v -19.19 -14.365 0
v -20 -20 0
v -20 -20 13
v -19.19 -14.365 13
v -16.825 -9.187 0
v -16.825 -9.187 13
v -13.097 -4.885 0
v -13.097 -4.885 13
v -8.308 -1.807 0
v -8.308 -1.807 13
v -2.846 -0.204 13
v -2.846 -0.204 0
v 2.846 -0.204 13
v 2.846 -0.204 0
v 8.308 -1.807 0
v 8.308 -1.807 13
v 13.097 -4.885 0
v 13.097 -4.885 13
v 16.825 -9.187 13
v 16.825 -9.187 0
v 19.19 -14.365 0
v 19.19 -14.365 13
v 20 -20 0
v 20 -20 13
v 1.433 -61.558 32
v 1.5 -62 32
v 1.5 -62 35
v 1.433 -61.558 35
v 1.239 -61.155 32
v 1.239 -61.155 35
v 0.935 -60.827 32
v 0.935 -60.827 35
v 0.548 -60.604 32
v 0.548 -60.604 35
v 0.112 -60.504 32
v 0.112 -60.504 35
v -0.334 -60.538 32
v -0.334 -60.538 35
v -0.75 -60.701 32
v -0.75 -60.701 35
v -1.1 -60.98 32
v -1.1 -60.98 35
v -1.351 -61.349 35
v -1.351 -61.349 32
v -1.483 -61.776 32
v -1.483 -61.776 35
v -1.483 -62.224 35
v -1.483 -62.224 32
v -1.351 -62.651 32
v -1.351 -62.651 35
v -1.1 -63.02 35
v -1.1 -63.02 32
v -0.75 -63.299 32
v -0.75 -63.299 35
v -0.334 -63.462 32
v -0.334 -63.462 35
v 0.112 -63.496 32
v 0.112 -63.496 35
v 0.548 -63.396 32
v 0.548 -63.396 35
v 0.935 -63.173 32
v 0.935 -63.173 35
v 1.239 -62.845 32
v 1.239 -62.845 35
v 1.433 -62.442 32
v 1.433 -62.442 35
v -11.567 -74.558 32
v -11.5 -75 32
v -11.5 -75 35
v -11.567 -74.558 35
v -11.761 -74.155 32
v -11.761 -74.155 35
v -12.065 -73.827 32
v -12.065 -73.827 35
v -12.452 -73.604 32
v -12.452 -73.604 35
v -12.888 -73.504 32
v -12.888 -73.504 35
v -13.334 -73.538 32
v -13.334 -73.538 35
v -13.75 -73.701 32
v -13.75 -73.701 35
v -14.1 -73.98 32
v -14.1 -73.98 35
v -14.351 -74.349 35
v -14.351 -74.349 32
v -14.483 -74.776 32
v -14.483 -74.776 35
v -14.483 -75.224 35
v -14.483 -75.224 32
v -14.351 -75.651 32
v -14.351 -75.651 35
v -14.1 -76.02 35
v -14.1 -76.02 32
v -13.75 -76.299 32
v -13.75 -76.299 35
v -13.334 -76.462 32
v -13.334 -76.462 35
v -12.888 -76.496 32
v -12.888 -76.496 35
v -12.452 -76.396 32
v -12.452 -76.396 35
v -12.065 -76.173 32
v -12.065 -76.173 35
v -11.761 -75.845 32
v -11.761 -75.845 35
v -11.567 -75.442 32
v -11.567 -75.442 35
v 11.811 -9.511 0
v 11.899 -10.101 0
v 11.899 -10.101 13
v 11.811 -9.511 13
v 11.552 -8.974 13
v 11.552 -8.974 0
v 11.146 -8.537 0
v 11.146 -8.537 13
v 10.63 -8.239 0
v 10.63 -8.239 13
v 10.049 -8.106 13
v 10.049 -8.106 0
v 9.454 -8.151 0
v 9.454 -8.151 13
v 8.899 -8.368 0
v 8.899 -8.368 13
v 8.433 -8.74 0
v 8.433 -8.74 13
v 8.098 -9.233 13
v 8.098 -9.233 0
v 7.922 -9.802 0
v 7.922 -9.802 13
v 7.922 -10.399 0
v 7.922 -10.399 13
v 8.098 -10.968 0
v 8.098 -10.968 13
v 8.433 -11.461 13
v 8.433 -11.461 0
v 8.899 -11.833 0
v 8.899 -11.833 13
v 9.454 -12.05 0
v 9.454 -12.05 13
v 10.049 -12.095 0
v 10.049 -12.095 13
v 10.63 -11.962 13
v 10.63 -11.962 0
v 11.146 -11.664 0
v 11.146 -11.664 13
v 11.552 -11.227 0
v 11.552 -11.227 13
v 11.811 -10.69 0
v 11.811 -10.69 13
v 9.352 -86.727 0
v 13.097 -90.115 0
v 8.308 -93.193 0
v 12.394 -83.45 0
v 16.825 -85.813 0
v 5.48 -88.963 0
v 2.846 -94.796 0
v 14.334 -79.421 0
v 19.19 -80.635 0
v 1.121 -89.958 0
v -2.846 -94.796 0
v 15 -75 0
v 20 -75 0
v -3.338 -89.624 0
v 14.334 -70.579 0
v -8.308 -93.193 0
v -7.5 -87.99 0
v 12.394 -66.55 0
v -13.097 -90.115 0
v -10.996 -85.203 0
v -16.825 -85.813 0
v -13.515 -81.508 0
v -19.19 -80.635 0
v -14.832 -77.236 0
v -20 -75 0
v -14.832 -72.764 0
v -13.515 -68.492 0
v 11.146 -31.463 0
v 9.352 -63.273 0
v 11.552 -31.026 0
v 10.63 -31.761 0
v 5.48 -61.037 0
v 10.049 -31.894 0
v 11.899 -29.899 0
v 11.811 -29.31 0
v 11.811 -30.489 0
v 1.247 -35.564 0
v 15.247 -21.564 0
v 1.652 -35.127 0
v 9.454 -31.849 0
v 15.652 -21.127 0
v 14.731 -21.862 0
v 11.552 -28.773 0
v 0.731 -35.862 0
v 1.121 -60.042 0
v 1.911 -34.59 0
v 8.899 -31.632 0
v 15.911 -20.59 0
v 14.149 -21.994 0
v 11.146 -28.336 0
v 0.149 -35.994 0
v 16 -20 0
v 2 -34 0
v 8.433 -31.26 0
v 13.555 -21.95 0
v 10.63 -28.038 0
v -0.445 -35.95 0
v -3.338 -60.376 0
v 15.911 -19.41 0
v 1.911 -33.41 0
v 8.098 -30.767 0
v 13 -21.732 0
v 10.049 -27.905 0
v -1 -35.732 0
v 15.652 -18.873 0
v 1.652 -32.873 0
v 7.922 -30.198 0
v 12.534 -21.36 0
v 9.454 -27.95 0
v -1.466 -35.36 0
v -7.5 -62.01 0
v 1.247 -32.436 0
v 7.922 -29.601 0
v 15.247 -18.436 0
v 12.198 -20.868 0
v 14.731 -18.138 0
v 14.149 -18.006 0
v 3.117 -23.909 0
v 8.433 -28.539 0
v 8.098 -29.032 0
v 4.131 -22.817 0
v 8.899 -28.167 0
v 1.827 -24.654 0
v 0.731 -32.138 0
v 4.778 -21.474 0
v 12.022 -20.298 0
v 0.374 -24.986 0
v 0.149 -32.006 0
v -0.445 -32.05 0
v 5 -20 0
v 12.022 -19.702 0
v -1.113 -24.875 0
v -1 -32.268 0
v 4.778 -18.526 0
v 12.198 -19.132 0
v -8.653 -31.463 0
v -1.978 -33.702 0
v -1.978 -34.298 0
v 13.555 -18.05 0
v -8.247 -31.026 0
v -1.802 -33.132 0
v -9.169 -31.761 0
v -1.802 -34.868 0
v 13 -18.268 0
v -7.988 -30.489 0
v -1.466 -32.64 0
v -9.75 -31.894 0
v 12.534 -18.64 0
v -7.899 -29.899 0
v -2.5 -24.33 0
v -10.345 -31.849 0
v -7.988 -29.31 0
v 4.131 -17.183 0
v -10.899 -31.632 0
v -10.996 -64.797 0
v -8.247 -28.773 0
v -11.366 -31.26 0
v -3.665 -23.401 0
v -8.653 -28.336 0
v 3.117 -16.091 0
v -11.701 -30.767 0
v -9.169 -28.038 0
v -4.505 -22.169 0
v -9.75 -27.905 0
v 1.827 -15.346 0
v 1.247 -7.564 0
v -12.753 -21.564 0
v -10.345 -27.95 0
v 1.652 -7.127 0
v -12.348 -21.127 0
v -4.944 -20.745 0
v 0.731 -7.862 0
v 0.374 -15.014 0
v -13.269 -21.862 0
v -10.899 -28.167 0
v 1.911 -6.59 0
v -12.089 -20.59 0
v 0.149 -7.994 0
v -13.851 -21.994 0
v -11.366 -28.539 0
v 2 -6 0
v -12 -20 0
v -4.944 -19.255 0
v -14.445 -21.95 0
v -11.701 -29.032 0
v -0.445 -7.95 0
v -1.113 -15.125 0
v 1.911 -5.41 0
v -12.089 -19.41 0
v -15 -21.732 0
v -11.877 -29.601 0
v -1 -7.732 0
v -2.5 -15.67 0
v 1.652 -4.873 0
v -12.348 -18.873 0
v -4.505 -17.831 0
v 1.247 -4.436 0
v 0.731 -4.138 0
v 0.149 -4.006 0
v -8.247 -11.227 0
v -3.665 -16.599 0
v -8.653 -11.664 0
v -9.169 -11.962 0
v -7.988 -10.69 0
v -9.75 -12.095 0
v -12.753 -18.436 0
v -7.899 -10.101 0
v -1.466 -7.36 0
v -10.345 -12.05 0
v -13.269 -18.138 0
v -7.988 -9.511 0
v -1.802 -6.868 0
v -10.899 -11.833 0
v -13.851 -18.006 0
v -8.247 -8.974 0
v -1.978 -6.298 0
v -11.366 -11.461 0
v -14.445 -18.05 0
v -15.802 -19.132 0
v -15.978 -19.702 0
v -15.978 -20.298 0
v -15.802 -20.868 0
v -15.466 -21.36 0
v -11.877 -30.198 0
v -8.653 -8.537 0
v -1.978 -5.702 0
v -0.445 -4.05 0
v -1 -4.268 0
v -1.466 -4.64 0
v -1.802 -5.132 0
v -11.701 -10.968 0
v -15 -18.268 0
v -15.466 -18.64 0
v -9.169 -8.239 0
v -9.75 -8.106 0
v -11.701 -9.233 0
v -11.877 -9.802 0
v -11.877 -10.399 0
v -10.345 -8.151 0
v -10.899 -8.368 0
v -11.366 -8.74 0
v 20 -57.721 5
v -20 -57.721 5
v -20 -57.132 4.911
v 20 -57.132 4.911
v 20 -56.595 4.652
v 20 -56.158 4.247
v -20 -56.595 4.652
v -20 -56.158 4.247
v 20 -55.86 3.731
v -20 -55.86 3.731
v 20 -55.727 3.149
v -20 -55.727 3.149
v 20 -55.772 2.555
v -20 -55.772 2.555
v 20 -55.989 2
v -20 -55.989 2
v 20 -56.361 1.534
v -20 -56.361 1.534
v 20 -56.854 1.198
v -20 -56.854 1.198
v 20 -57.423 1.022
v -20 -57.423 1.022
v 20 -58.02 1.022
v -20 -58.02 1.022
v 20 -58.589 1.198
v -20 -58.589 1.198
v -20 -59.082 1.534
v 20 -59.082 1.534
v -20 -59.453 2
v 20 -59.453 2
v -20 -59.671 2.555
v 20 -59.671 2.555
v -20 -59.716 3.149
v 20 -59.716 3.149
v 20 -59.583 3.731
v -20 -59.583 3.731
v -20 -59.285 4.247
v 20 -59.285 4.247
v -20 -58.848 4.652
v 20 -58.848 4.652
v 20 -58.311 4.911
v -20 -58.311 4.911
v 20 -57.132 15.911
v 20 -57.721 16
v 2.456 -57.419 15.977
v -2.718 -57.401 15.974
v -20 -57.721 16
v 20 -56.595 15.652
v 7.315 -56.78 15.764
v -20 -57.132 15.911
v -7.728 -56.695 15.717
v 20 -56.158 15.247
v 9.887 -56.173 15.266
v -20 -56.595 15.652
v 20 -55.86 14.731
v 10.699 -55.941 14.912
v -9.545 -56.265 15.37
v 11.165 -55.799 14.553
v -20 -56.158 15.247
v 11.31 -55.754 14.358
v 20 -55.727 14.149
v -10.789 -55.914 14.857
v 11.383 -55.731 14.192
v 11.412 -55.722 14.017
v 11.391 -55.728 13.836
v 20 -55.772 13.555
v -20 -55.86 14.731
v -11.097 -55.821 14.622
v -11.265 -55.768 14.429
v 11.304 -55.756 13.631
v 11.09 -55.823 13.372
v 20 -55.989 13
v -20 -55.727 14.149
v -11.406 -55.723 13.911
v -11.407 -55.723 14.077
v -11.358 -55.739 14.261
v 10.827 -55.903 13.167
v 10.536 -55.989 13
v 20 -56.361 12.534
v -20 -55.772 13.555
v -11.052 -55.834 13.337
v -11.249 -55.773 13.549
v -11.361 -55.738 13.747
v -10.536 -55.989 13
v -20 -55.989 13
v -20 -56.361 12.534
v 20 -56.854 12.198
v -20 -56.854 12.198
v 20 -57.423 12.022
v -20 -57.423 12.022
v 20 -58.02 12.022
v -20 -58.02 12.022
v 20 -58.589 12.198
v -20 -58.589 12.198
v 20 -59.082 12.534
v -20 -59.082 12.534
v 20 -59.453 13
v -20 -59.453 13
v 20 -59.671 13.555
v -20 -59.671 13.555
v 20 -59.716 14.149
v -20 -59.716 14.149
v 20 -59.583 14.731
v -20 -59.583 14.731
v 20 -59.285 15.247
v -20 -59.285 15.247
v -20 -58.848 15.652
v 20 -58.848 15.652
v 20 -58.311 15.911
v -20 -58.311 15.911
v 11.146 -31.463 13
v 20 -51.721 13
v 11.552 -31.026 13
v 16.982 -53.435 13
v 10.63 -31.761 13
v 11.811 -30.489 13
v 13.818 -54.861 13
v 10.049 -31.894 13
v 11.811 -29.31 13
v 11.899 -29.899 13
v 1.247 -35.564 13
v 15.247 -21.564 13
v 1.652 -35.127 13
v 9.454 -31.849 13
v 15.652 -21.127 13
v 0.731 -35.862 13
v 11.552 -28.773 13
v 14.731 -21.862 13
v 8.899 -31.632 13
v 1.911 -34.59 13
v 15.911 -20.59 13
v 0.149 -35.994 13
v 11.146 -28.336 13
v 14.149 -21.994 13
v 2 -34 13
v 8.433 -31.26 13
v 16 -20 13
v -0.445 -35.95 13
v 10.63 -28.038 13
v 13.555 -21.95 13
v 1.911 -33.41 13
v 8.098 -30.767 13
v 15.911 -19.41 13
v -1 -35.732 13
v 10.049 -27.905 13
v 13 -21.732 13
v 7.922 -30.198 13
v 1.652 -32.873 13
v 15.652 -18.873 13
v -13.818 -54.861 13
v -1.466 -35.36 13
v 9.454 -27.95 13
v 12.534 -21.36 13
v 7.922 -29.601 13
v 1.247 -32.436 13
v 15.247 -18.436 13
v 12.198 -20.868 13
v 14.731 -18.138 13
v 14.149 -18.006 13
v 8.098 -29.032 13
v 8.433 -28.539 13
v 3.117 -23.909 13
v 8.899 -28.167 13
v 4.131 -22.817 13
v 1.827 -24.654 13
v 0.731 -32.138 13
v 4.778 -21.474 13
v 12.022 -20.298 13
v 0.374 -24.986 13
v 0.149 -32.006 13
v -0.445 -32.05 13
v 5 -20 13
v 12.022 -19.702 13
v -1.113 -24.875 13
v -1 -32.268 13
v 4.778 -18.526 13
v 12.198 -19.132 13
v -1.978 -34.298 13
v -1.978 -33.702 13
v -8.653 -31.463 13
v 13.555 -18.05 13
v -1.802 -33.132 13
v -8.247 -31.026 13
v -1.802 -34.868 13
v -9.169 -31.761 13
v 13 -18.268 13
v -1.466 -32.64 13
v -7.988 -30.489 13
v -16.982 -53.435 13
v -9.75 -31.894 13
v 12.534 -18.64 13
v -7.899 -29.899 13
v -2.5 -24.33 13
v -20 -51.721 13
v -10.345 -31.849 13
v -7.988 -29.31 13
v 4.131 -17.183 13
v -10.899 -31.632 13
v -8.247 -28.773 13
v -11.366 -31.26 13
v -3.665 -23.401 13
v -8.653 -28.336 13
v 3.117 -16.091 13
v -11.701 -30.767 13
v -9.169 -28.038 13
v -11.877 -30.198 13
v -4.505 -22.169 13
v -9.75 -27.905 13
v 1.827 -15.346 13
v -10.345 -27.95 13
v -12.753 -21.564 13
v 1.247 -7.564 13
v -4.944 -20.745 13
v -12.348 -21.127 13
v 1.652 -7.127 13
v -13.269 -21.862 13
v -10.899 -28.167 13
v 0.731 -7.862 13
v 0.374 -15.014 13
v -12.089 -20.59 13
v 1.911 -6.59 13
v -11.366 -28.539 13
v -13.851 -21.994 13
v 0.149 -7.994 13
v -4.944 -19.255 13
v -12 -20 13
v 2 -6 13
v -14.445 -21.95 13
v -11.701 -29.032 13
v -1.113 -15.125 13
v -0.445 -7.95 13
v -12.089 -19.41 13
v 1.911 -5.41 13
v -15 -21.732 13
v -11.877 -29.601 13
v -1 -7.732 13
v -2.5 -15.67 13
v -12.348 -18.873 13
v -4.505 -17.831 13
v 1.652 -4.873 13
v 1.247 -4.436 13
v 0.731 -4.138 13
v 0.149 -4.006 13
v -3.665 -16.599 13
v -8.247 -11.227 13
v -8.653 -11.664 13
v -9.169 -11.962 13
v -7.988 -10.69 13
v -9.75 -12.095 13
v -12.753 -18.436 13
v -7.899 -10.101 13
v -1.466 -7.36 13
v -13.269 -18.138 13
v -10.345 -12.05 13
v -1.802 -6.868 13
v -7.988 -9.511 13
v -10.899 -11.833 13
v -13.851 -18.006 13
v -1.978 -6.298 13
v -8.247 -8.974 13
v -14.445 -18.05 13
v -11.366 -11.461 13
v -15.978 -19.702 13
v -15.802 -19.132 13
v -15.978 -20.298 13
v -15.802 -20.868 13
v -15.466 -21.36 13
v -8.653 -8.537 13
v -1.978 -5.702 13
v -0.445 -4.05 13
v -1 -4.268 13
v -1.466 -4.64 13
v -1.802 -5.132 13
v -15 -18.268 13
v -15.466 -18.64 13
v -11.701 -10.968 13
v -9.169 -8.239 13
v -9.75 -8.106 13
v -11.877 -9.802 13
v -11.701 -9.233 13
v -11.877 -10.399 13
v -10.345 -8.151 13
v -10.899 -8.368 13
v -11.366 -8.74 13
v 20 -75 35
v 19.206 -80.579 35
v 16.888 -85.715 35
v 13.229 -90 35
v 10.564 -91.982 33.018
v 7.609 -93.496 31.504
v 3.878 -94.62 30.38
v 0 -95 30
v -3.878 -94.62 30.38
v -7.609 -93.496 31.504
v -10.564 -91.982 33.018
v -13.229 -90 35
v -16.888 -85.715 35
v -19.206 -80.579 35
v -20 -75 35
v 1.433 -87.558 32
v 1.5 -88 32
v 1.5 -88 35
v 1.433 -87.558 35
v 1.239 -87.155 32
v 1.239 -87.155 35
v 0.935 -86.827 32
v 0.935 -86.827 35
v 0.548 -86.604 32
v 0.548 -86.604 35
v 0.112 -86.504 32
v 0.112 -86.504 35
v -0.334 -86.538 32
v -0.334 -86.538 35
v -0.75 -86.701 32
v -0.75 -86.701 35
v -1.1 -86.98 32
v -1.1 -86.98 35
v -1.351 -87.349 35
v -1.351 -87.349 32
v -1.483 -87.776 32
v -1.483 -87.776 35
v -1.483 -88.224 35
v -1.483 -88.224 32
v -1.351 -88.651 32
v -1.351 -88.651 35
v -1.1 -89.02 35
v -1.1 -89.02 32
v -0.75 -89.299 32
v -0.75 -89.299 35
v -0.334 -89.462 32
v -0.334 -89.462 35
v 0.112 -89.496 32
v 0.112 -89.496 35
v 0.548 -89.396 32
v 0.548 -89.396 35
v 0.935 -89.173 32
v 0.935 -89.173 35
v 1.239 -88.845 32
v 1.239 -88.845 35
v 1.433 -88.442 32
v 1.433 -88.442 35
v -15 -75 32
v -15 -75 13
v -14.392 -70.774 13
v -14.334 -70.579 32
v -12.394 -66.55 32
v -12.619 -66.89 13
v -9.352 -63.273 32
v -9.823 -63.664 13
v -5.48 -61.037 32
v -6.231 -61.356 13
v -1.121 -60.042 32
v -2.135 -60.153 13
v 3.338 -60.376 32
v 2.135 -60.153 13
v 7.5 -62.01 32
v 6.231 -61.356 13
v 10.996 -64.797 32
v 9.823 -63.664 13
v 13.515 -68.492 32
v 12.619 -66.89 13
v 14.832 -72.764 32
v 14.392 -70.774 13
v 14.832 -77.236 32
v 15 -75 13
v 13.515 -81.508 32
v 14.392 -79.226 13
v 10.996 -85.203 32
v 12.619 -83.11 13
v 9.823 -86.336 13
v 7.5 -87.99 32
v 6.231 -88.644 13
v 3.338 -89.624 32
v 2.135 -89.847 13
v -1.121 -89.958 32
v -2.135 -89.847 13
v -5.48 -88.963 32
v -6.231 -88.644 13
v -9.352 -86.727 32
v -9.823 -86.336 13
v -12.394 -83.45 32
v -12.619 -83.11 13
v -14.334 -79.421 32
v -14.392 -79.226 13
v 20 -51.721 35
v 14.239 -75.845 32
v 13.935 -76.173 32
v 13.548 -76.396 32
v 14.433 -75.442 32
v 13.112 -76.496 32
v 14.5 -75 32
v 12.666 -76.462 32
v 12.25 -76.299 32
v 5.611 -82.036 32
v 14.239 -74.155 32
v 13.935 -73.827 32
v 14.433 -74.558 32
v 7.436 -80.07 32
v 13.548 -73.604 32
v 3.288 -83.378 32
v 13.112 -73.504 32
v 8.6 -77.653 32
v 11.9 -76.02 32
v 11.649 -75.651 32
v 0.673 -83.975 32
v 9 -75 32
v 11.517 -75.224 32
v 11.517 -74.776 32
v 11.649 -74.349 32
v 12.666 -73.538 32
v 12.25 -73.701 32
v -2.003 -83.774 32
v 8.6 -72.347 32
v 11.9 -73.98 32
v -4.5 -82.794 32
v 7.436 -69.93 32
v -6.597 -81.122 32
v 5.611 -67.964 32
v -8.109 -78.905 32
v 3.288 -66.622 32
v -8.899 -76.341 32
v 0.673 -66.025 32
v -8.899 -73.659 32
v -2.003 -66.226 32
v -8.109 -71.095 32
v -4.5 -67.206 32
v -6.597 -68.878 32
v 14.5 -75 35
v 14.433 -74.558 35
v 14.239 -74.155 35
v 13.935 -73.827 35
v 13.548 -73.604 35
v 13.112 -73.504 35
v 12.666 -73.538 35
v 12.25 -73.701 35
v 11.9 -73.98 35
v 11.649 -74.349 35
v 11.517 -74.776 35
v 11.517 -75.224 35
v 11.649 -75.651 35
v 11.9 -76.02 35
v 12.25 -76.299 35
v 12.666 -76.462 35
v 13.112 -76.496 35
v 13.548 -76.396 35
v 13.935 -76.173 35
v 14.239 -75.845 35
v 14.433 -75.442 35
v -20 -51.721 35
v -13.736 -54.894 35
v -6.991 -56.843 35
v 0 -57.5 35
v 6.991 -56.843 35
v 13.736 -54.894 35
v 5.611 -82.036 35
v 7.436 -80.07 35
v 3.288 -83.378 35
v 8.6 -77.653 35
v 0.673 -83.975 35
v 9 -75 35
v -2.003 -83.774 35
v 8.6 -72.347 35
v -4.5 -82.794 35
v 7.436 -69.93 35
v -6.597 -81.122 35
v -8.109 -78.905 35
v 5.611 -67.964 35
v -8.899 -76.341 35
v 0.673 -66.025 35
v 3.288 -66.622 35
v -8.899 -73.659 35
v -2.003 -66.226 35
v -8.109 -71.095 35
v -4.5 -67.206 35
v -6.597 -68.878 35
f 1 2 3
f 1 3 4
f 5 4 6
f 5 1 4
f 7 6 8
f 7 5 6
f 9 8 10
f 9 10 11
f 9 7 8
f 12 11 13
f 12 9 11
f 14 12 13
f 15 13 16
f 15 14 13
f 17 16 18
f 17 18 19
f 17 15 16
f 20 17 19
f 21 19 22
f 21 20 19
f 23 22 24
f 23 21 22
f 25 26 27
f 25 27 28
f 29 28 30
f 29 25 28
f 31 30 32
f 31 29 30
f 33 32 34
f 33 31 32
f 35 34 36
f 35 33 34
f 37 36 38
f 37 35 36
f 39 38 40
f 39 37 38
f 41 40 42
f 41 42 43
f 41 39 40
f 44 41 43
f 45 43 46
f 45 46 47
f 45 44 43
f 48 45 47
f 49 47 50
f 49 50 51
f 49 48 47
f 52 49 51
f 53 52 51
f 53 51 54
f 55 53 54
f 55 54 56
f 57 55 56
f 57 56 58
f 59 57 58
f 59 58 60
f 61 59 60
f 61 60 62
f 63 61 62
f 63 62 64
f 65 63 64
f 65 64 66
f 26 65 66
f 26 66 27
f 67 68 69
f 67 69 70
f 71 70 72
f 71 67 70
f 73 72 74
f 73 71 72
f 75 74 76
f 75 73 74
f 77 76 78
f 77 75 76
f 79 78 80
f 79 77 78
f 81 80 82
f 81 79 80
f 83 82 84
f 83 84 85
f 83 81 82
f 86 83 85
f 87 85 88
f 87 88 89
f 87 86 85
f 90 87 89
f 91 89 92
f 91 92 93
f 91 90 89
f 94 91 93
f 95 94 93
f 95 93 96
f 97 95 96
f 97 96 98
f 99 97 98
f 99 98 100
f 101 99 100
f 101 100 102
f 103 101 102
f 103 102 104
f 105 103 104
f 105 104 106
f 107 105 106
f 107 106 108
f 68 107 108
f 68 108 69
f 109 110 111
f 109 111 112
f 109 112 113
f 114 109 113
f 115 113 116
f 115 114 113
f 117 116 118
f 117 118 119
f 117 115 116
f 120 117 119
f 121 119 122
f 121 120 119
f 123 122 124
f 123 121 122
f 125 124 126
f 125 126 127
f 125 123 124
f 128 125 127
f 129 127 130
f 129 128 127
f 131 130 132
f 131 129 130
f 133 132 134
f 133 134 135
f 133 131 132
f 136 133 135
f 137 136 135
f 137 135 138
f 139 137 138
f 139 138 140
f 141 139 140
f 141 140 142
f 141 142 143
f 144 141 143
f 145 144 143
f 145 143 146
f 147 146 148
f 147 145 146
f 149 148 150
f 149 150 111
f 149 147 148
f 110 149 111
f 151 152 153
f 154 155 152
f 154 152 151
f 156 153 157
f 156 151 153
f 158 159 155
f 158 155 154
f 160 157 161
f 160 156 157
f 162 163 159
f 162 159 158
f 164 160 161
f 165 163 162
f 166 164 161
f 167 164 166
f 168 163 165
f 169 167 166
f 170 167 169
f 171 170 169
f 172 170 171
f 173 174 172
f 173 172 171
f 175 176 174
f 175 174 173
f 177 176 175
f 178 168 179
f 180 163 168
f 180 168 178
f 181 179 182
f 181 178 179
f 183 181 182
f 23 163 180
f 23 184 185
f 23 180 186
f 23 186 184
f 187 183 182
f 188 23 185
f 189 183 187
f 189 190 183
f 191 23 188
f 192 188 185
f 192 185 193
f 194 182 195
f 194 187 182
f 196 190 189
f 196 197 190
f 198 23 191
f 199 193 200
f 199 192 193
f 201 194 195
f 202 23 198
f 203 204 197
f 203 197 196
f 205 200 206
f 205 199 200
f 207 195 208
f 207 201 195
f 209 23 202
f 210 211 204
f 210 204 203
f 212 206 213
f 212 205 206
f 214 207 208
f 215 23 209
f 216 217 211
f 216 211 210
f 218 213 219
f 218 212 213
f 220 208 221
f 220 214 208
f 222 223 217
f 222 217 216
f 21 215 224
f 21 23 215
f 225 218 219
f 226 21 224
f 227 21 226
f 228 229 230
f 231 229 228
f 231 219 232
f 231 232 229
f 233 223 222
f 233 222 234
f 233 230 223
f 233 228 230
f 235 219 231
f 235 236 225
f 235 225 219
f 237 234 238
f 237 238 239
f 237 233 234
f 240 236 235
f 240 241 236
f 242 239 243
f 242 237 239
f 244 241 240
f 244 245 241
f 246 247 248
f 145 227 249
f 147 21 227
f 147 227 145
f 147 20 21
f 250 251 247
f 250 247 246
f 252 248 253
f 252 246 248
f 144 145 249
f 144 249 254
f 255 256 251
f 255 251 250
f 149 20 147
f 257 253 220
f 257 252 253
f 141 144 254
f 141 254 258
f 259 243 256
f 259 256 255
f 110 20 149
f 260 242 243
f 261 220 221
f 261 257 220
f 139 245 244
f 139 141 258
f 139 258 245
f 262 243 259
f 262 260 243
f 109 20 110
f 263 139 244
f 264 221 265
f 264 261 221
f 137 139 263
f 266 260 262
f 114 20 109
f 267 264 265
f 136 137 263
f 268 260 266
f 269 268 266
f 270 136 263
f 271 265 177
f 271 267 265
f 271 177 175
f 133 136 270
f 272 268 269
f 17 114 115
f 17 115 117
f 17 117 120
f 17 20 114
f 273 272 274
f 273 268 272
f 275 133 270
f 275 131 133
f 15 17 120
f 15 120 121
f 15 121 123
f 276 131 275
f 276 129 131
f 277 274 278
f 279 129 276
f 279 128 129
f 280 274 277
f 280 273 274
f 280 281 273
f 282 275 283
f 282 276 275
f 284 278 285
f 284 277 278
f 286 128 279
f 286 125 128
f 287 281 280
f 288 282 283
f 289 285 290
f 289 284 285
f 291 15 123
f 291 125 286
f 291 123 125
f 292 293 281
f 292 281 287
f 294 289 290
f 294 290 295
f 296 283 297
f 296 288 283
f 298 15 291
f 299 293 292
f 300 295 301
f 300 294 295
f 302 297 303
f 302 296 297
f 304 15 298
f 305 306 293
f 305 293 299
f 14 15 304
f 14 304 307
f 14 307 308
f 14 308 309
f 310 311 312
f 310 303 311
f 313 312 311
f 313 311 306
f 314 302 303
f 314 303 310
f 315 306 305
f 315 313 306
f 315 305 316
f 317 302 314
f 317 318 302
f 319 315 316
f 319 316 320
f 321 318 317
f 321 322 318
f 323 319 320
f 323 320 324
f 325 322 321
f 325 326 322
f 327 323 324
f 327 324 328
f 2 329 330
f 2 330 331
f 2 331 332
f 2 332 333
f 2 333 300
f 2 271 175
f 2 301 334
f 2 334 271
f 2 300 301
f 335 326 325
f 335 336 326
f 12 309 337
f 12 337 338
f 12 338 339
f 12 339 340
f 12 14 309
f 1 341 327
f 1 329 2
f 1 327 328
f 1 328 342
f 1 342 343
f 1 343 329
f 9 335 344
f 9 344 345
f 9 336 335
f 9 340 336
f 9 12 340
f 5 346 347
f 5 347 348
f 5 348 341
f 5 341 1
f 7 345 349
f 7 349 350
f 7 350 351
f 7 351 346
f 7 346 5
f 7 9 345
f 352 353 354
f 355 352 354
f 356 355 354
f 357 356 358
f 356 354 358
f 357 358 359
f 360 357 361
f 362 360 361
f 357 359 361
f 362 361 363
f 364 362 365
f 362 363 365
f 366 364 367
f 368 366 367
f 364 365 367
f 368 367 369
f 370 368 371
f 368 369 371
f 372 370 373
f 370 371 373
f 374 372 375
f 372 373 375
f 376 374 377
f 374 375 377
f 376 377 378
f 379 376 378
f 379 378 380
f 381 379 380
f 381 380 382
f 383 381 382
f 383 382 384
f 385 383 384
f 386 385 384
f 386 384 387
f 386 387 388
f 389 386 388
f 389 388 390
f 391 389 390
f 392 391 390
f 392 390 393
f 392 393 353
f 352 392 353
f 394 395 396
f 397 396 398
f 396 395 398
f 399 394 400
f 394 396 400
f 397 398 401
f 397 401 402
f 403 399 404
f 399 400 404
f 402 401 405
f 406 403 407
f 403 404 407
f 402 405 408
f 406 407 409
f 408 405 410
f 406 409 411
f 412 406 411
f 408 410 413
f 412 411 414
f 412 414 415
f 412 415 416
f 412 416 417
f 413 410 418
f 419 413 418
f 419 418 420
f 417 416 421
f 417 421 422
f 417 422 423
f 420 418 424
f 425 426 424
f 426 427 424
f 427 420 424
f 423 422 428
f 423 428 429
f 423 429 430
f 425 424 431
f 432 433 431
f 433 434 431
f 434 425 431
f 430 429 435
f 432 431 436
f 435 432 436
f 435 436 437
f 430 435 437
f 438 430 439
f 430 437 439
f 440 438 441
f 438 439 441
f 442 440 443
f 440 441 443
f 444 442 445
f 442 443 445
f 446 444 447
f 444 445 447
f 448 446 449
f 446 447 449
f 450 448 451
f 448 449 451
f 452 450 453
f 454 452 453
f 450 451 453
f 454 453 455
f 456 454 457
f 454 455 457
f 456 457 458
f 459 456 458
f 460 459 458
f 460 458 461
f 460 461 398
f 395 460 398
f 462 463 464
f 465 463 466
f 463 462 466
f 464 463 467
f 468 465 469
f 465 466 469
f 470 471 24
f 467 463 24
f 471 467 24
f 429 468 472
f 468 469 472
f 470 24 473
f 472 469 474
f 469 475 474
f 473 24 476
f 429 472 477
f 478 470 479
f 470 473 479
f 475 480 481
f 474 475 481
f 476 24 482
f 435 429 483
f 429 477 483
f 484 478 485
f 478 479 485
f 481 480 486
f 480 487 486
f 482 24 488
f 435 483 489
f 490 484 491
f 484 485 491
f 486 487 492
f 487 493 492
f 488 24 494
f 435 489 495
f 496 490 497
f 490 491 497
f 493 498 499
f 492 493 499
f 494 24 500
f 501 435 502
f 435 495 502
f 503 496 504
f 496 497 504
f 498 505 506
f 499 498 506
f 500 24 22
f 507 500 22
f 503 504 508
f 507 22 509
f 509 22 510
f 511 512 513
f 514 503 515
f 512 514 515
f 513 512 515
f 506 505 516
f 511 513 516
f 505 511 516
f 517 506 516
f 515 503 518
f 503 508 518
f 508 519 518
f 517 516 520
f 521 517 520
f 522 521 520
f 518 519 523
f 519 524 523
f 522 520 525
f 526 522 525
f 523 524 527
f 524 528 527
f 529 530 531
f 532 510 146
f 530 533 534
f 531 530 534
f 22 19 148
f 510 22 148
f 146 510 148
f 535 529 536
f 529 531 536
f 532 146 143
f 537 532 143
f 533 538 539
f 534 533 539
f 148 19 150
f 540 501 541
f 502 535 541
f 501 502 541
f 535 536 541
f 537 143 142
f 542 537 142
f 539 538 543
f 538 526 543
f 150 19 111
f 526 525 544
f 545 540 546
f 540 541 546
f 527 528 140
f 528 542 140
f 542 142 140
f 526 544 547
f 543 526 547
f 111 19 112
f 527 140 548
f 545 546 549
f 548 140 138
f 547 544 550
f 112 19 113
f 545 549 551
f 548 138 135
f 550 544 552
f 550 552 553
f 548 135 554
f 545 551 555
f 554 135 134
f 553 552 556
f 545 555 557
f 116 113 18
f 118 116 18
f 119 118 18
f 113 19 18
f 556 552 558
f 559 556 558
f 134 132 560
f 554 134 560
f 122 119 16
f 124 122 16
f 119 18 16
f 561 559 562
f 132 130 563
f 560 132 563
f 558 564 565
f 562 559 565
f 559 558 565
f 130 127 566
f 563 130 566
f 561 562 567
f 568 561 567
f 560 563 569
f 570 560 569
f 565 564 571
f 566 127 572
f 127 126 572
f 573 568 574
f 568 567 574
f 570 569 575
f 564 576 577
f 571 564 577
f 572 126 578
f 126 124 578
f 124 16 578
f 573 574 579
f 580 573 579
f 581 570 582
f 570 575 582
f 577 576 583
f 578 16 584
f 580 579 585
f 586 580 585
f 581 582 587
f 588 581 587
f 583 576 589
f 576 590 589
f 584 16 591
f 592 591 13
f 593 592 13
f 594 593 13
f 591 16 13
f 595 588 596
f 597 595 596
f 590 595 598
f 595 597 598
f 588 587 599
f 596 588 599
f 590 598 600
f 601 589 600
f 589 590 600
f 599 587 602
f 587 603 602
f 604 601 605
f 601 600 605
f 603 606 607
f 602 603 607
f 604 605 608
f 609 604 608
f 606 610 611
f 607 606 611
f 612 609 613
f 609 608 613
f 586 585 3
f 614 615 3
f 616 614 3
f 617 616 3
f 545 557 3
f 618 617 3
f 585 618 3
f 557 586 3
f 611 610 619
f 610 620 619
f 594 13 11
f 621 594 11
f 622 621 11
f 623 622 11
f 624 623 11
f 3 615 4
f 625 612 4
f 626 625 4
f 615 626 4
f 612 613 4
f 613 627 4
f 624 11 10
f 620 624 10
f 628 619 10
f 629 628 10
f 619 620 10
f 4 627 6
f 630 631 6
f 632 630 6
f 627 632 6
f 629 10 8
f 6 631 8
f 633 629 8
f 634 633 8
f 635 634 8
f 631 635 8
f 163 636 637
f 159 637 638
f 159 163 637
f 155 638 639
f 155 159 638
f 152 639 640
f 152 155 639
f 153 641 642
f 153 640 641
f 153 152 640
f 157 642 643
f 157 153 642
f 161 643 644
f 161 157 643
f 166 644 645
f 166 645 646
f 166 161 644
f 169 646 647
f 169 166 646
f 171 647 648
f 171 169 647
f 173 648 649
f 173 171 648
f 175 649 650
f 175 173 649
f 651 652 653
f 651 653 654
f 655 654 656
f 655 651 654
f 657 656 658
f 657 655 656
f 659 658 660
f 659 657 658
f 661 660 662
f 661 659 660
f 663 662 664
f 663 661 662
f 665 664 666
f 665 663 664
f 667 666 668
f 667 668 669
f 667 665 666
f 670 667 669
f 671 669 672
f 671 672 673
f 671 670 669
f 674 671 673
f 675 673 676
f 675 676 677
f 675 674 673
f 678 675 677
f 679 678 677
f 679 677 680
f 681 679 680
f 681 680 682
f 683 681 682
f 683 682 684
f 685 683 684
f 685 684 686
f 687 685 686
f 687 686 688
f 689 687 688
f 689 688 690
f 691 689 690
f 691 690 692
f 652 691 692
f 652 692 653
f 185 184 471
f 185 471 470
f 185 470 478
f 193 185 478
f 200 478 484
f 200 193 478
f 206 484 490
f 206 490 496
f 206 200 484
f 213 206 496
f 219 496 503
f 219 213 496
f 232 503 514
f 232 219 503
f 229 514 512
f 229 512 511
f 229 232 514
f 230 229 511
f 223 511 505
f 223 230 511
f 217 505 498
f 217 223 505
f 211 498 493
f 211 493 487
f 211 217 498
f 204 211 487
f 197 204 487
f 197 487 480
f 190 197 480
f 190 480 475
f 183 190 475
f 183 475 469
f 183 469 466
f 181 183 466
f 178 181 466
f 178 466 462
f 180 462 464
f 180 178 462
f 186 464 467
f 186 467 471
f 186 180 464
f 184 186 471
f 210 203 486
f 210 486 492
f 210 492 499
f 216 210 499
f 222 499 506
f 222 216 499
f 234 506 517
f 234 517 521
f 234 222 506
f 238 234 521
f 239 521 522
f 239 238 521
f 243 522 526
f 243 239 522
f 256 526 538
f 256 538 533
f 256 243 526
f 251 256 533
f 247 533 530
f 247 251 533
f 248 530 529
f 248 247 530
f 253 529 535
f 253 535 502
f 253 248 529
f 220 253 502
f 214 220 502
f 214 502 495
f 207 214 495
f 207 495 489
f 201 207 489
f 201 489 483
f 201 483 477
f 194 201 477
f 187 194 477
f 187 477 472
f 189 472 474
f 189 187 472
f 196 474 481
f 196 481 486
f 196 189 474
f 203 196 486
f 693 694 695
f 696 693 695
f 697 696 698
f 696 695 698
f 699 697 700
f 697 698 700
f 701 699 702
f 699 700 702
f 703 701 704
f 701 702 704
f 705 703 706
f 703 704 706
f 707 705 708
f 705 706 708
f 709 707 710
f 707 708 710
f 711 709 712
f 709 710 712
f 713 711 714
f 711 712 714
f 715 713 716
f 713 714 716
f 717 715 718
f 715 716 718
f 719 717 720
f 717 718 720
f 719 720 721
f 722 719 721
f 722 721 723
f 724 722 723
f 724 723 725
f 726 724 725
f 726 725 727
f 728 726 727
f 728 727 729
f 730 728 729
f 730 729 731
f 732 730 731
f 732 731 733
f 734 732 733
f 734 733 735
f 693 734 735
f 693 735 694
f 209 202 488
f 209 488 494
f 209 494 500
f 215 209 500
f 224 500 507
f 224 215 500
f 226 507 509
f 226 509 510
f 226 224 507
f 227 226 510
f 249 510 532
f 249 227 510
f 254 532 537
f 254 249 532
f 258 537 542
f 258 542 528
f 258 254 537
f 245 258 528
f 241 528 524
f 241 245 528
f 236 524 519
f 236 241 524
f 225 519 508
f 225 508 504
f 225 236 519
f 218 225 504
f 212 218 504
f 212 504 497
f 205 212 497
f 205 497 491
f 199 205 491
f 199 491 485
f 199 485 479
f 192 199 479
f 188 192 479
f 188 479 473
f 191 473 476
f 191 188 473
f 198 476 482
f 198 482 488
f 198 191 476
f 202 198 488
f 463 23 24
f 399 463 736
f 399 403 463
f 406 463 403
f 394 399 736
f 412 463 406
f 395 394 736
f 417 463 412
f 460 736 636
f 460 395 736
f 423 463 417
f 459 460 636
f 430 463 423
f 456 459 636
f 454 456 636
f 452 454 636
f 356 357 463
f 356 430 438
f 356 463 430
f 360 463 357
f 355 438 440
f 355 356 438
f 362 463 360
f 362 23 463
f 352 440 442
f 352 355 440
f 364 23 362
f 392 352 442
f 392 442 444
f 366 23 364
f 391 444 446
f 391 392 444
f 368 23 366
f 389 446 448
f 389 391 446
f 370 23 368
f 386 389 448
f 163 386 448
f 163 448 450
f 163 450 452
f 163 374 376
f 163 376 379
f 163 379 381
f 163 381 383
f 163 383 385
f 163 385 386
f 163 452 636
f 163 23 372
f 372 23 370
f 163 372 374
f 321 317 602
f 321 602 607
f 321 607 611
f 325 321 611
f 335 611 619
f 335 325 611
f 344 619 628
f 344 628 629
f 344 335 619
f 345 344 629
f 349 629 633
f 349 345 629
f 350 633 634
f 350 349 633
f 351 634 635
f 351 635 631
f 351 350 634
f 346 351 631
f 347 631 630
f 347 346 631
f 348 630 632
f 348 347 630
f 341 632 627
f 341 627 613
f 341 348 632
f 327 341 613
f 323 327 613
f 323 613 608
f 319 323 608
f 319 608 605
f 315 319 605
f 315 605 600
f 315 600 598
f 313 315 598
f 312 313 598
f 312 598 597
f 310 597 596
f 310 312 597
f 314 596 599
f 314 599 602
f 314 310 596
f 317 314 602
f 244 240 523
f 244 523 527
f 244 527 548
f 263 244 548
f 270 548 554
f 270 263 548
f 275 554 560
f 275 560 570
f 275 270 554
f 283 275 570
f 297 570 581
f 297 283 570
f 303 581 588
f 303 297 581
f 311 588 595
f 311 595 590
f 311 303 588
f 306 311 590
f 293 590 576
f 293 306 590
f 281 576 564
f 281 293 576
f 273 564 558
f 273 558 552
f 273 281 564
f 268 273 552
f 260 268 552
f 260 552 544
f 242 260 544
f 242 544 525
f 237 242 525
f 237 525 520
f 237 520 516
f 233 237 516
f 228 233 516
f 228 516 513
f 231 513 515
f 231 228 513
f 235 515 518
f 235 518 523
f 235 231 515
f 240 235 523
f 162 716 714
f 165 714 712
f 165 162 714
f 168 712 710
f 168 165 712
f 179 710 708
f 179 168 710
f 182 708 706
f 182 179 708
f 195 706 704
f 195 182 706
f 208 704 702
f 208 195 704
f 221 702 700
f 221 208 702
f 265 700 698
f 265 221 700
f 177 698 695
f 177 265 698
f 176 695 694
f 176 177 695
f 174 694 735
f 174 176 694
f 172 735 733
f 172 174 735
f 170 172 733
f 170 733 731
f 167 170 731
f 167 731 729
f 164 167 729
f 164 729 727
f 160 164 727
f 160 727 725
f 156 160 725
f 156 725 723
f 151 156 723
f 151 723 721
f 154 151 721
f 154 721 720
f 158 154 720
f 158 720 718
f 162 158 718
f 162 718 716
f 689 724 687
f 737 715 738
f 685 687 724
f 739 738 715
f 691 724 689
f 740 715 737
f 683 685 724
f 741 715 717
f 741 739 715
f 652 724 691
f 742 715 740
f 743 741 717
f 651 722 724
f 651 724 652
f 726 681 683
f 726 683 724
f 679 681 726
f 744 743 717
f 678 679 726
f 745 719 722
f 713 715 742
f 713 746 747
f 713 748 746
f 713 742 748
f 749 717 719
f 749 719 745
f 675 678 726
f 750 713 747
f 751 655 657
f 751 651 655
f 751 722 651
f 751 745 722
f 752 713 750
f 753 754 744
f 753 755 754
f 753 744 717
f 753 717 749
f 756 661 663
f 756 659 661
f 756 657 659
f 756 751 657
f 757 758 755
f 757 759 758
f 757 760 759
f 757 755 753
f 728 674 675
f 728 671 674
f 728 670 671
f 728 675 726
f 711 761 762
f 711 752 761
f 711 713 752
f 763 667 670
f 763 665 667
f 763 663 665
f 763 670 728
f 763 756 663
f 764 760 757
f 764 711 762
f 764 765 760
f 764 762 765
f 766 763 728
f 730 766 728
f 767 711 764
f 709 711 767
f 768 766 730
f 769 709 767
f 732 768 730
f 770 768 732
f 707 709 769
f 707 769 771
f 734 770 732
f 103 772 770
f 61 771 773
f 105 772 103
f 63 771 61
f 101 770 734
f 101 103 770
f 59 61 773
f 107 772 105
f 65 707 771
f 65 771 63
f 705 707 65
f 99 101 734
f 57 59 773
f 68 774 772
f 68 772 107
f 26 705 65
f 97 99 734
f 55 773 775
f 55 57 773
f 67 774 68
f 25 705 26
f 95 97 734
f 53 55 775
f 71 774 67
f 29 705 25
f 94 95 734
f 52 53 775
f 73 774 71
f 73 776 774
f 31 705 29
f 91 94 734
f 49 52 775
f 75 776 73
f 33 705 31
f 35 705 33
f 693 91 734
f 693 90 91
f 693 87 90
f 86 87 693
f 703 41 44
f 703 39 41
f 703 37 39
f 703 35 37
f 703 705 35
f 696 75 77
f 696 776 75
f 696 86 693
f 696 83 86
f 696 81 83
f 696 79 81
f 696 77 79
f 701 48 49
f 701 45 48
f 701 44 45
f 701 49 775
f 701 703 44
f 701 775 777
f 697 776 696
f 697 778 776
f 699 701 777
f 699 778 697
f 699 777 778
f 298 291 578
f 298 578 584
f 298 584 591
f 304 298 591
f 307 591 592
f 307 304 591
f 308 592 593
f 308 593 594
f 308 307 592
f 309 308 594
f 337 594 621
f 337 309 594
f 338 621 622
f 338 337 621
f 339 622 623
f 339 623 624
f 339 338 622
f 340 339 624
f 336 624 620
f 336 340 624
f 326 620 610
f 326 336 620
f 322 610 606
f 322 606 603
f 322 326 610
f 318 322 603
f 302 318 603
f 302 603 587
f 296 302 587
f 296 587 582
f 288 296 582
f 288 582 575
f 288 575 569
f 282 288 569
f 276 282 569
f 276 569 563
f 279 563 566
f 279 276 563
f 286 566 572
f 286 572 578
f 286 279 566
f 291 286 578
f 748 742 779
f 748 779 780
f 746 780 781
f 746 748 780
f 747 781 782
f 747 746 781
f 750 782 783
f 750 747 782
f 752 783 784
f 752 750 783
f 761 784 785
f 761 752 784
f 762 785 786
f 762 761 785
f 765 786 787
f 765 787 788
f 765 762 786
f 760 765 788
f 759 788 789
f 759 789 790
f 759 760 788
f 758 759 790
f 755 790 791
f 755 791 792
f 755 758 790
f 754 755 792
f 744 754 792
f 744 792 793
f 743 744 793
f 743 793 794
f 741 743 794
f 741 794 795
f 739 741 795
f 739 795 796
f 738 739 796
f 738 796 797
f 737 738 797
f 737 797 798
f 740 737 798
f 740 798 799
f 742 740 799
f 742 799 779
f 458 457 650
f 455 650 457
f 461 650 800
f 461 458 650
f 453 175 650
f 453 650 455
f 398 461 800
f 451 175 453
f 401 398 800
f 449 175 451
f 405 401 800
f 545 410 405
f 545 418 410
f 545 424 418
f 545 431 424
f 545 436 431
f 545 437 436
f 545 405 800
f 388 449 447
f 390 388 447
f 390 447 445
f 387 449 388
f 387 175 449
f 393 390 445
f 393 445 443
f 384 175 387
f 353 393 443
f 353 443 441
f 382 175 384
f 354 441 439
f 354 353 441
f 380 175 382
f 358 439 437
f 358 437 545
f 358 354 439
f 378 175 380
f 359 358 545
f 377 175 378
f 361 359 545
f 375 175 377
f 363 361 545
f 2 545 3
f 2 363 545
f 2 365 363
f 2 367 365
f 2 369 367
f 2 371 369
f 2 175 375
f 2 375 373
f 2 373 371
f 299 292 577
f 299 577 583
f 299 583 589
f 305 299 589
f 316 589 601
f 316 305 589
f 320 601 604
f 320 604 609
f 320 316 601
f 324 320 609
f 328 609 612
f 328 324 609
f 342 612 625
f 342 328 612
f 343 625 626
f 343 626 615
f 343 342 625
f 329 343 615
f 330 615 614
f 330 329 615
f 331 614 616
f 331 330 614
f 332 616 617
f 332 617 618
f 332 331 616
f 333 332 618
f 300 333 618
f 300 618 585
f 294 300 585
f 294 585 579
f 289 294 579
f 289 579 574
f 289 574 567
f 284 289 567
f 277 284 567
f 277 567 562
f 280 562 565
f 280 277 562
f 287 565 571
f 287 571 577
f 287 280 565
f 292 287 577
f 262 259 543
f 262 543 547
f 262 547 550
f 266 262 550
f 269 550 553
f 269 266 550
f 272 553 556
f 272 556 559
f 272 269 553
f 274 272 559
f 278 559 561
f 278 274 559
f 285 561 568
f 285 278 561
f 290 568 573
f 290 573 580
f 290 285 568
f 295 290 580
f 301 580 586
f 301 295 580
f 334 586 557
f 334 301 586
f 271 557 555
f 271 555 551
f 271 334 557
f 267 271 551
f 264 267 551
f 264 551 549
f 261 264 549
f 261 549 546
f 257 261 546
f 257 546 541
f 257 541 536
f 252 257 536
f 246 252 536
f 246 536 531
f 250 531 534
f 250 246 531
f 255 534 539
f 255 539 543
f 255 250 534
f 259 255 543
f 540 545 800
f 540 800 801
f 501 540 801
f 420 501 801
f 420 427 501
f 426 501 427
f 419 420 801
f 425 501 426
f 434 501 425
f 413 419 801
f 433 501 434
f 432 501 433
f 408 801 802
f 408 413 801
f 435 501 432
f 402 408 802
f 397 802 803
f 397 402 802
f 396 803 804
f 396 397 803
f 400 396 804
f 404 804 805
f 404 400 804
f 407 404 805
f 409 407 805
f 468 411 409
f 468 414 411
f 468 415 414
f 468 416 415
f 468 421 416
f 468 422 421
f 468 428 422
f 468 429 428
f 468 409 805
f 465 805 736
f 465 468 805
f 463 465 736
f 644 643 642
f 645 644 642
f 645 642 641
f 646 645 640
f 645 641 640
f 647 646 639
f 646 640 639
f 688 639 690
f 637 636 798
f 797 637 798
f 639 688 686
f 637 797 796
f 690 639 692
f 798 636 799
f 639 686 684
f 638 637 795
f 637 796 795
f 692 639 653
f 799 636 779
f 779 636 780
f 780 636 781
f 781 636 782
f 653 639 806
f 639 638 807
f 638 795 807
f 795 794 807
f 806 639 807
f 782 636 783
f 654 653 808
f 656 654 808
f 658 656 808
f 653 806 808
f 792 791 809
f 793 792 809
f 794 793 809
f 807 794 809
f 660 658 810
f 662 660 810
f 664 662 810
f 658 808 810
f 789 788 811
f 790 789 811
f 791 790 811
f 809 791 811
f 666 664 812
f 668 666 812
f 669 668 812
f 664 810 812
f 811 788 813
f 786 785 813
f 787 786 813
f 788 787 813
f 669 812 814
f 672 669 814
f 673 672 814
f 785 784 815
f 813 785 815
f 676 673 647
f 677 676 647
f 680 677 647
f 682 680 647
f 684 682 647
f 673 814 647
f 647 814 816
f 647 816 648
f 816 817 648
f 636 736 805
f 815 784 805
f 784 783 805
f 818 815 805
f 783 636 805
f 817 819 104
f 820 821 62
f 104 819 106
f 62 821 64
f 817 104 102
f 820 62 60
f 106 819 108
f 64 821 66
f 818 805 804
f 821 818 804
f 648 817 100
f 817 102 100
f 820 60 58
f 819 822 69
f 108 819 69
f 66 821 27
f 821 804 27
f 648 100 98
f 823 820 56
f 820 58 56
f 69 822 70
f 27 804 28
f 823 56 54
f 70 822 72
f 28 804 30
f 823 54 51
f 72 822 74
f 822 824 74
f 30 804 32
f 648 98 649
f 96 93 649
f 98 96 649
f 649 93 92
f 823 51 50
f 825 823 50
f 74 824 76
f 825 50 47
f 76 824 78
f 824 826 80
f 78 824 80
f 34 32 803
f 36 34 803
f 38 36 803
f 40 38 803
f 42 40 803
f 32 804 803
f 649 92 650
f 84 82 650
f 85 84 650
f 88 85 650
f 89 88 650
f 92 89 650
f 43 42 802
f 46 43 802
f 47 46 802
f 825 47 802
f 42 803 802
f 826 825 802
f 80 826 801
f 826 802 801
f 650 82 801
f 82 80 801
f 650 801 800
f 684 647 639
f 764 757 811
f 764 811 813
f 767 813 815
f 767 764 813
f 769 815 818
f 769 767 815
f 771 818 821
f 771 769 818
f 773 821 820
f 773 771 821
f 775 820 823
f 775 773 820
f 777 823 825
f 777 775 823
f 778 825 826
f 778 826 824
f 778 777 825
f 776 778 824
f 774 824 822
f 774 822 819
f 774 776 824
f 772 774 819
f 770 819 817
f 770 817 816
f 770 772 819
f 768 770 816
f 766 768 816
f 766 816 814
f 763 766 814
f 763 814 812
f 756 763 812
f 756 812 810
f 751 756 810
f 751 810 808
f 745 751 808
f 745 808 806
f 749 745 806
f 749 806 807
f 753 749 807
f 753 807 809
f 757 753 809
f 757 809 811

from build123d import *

# Parameters (mm, degrees)
ESQUISSE1_R           = 15
ESQUISSE1_R_2         = 5
ESQUISSE1_R_3         = 2
EXTRUSION1_DEPTH      = 13
ESQUISSE2_R           = 9
ESQUISSE2_R_2         = 1.5
EXTRUSION2_DEPTH      = 22
ESQUISSE3_R           = 15
EXTRUSION3_DEPTH      = 19
EXTRUSION4_DEPTH      = 21
EXTRUSION4_DEPTH_BACK = 21
EXTRUSION5_REACH      = 42
ESQUISSE5_R           = 2


with BuildPart() as part:
    # Esquisse1 → Extrusion1 (new body)
    with BuildSketch(Plane.XY):
        with BuildLine():
            Line((20, -20), (20, -75))
            ThreePointArc((20, -75), (0, -95), (-20, -75))
            Line((-20, -75), (-20, -20))
            ThreePointArc((-20, -20), (0, 0), (20, -20))
        make_face()
        with Locations((0, -75)):
            Circle(ESQUISSE1_R, mode=Mode.SUBTRACT)
        with Locations((0, -20)):
            Circle(ESQUISSE1_R_2, mode=Mode.SUBTRACT)
        with Locations((-14, -20)):
            Circle(ESQUISSE1_R_3, mode=Mode.SUBTRACT)
        with Locations((-9.899494937, -10.100505063)):
            Circle(ESQUISSE1_R_3, mode=Mode.SUBTRACT)
        with Locations((0, -6)):
            Circle(ESQUISSE1_R_3, mode=Mode.SUBTRACT)
        with Locations((9.899494937, -10.100505063)):
            Circle(ESQUISSE1_R_3, mode=Mode.SUBTRACT)
        with Locations((14, -20)):
            Circle(ESQUISSE1_R_3, mode=Mode.SUBTRACT)
        with Locations((9.899494937, -29.899494937)):
            Circle(ESQUISSE1_R_3, mode=Mode.SUBTRACT)
        with Locations((0, -34)):
            Circle(ESQUISSE1_R_3, mode=Mode.SUBTRACT)
        with Locations((-9.899494937, -29.899494937)):
            Circle(ESQUISSE1_R_3, mode=Mode.SUBTRACT)
    extrude(amount=EXTRUSION1_DEPTH)

    # Esquisse2 → Extrusion2 (add)
    with BuildSketch(Plane.XY.offset(13)):
        with BuildLine():
            Line((-20, -75), (-20, -51.721443851))
            ThreePointArc((-20, -51.721443851), (0, -57.5), (20, -51.721443851))
            Line((20, -51.721443851), (20, -75))
            ThreePointArc((20, -75), (0, -95), (-20, -75))
        make_face()
        with Locations((0, -75)):
            Circle(ESQUISSE2_R, mode=Mode.SUBTRACT)
        with Locations((0, -62)):
            Circle(ESQUISSE2_R_2, mode=Mode.SUBTRACT)
        with Locations((0, -88)):
            Circle(ESQUISSE2_R_2, mode=Mode.SUBTRACT)
        with Locations((-13, -75)):
            Circle(ESQUISSE2_R_2, mode=Mode.SUBTRACT)
        with Locations((13, -75)):
            Circle(ESQUISSE2_R_2, mode=Mode.SUBTRACT)
    extrude(amount=EXTRUSION2_DEPTH)

    # Esquisse3 → Extrusion3 (cut)
    with BuildSketch(Plane(origin=(0, 0, 13), x_dir=(-1, 0, 0), z_dir=(0, 0, -1))):
        with Locations((0, -75)):
            Circle(ESQUISSE3_R)
    extrude(amount=-EXTRUSION3_DEPTH, mode=Mode.SUBTRACT)

    # Esquisse4 → Extrusion4 (cut, two sides)
    with BuildSketch(Plane(origin=(0, 0, 0), x_dir=(0, 0, -1), z_dir=(1, 0, 0))) as extrusion4_sk:
        Polygon((-35, -95), (-30, -95), (-35, -90), align=None)
    extrude(amount=EXTRUSION4_DEPTH, mode=Mode.SUBTRACT)
    extrude(extrusion4_sk.sketch, amount=-EXTRUSION4_DEPTH_BACK, mode=Mode.SUBTRACT)

    # Esquisse5 → Extrusion5 (cut, up to next)
    with BuildSketch(Plane.ZY.offset(20), mode=Mode.PRIVATE) as extrusion5_sk1:
        with Locations((14, -57.721443851)):
            Circle(ESQUISSE5_R)
    extrusion5_tool1 = extrude(extrusion5_sk1.sketch, amount=-EXTRUSION5_REACH, mode=Mode.PRIVATE) & part.part
    add(extrusion5_tool1.solids().sort_by_distance((-20, -57.721444, 14))[0], mode=Mode.SUBTRACT)
    # Esquisse5 → Extrusion5 (cut, up to next)
    with BuildSketch(Plane.ZY.offset(20), mode=Mode.PRIVATE) as extrusion5_sk2:
        with Locations((3, -57.721443851)):
            Circle(ESQUISSE5_R)
    extrusion5_tool2 = extrude(extrusion5_sk2.sketch, amount=-EXTRUSION5_REACH, mode=Mode.PRIVATE) & part.part
    add(extrusion5_tool2.solids().sort_by_distance((-20, -57.721444, 3))[0], mode=Mode.SUBTRACT)


solid = part.part
